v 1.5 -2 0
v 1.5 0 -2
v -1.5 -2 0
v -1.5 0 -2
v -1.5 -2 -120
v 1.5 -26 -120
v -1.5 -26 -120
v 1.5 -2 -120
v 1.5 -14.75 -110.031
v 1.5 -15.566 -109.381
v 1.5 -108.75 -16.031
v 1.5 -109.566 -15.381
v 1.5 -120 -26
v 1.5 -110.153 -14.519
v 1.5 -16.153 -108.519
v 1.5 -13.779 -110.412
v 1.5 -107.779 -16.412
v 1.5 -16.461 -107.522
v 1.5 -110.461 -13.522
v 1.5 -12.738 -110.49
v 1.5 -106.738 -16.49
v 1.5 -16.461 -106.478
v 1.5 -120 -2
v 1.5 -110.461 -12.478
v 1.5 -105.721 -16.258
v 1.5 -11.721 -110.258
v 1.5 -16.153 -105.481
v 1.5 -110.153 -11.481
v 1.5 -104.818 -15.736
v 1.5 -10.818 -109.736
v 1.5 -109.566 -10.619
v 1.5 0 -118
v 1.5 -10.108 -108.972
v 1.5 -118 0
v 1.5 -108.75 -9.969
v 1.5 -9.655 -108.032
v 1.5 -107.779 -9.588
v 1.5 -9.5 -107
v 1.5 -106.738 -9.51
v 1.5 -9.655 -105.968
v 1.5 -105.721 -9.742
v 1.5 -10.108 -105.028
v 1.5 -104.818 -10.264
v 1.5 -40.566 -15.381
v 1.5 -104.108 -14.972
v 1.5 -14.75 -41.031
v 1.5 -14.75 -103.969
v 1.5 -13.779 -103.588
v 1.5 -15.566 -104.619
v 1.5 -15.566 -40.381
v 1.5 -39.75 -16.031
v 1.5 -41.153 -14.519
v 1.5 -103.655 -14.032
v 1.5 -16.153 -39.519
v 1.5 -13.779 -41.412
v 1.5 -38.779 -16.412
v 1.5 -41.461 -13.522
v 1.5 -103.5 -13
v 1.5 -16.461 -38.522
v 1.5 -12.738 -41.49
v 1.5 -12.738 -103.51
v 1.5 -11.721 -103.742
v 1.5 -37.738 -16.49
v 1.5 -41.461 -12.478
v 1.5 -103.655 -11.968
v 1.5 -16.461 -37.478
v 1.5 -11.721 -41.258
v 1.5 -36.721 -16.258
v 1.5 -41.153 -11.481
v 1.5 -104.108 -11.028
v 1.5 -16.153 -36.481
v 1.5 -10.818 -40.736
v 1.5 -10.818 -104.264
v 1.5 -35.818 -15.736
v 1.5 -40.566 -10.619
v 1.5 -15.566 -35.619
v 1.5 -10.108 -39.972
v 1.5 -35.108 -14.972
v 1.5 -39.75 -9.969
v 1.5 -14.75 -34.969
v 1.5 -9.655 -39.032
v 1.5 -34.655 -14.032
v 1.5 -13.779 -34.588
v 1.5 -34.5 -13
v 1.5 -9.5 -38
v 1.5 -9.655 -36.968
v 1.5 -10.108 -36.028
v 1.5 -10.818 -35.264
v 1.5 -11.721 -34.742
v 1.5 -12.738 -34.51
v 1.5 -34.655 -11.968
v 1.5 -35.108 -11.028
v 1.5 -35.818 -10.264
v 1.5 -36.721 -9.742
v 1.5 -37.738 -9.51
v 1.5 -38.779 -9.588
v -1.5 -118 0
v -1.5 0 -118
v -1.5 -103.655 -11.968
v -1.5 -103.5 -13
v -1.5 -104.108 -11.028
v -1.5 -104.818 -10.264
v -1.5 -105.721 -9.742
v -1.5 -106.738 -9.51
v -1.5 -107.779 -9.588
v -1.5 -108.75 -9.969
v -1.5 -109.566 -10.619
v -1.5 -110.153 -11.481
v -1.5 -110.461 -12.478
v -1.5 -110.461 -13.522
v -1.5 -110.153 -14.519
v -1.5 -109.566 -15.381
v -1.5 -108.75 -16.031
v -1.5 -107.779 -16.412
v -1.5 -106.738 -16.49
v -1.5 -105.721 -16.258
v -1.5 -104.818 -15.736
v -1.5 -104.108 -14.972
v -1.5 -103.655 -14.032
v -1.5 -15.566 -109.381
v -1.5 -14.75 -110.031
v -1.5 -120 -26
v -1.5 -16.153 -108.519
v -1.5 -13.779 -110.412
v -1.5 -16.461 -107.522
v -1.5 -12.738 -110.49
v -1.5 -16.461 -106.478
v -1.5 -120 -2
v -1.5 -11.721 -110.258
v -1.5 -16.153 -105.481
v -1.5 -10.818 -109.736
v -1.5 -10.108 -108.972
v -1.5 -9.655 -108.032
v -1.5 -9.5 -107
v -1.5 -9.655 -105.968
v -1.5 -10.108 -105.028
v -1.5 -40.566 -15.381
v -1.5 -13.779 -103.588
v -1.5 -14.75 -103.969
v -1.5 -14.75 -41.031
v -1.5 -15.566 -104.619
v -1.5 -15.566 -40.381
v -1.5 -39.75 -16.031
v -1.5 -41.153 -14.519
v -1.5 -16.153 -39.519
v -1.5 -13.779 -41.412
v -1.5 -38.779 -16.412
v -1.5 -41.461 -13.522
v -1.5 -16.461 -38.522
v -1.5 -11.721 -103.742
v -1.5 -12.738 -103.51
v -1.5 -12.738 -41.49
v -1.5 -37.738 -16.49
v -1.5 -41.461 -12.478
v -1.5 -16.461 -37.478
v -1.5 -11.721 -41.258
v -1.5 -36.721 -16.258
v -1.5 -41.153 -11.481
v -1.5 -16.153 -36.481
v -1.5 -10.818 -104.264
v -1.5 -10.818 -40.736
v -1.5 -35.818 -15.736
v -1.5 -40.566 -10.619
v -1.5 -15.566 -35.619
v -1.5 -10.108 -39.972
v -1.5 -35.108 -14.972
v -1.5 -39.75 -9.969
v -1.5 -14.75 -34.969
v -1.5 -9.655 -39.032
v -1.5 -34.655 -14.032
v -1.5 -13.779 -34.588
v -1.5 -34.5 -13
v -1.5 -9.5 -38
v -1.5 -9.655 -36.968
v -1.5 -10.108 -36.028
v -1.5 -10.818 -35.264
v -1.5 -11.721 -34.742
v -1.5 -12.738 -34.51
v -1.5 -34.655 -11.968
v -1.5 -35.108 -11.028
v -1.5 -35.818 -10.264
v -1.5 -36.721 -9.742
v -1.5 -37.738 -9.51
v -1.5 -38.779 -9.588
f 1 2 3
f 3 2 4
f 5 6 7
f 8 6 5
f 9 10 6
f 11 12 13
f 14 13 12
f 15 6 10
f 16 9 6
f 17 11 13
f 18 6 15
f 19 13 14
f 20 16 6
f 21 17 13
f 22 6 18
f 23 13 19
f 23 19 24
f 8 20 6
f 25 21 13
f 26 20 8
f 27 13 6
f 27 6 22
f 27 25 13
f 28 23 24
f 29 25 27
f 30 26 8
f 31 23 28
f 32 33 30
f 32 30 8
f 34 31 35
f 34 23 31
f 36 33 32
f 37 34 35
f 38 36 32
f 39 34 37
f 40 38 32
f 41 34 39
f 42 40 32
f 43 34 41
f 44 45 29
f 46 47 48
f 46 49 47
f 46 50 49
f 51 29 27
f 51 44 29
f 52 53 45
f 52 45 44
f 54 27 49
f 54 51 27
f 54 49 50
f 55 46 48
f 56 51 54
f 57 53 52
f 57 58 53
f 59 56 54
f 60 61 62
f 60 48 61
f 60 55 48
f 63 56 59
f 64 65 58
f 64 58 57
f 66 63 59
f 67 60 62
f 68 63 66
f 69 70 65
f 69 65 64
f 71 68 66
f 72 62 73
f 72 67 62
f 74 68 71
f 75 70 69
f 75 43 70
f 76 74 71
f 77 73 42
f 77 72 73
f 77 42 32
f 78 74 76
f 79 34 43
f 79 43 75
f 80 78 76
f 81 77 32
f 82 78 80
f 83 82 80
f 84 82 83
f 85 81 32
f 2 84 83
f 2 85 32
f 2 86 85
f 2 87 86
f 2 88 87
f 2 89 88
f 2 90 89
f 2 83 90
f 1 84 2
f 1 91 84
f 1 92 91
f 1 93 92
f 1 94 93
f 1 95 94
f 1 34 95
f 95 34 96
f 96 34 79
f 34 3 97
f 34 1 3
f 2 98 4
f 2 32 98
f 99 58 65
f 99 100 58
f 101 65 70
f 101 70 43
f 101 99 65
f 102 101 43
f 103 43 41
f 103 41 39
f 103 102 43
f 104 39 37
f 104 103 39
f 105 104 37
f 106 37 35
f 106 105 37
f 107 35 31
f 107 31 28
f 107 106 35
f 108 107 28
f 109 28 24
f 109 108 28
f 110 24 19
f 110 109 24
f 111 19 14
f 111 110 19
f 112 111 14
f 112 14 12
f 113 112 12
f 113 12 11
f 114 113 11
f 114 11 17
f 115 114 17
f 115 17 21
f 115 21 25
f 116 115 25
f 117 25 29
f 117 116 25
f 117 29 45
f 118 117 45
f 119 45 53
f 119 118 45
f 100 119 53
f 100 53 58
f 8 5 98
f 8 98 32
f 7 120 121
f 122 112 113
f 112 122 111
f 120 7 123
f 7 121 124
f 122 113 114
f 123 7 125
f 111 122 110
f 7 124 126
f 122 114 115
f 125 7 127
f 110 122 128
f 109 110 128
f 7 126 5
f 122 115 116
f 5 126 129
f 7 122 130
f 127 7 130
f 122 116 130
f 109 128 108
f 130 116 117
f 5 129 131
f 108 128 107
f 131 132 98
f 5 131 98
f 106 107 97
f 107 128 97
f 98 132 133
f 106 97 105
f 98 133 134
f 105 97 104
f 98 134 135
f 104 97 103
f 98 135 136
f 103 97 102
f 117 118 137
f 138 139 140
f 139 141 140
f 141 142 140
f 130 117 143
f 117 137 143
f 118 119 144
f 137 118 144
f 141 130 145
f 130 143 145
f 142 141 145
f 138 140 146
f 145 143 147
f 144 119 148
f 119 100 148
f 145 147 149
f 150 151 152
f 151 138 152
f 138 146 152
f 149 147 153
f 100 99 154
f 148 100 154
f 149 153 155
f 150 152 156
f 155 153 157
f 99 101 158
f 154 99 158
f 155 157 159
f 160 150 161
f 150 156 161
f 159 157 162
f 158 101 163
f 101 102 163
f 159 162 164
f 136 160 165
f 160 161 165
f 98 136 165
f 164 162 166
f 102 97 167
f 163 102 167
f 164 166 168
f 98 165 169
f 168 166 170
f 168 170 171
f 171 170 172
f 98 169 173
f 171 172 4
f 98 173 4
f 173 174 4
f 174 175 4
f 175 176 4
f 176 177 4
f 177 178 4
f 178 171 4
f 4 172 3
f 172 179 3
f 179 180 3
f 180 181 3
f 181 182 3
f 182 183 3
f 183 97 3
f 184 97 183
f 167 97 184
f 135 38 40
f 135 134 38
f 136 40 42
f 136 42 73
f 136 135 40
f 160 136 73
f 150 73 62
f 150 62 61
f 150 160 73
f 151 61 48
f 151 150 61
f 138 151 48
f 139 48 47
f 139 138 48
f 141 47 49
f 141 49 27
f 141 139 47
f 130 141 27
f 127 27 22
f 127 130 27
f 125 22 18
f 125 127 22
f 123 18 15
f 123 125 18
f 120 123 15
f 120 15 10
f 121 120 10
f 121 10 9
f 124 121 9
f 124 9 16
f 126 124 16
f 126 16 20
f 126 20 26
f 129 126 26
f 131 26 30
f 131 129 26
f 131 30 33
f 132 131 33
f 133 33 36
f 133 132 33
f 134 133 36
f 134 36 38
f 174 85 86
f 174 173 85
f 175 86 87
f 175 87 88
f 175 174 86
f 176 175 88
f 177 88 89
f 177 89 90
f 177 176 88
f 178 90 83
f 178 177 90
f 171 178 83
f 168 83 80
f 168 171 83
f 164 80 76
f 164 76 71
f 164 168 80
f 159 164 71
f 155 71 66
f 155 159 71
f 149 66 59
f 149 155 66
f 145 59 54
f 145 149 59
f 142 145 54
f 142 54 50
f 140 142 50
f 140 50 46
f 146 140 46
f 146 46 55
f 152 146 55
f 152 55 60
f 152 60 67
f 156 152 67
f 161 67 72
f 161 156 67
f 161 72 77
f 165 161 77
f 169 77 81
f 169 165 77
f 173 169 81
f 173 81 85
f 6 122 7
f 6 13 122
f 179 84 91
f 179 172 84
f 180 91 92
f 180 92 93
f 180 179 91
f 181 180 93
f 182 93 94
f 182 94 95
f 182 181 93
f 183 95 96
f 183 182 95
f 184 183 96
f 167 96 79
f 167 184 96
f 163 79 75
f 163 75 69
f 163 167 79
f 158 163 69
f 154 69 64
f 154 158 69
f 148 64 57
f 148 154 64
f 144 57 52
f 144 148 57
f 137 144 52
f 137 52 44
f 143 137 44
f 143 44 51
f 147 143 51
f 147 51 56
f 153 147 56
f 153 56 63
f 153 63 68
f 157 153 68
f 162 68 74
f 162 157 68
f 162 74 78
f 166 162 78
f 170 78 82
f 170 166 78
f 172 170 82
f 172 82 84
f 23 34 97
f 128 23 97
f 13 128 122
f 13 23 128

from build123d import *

# Parameters (mm, degrees)
F0_R     = 3.5
F1_DEPTH = 1.5
F2_SIZE  = 2


with BuildPart() as f1:
    # F0 (on Right) → F1 (new body, symmetric)
    with BuildSketch(Plane.YZ):
        Polygon((-73, -73), (0, 0), (-120, 0), (-120, -26), align=None)
        with Locations((-107, -13)):
            Circle(F0_R, mode=Mode.SUBTRACT)
        with Locations((-38, -13)):
            Circle(F0_R, mode=Mode.SUBTRACT)
        Polygon((0, -120), (0, 0), (-73, -73), (-26, -120), align=None)
        with Locations((-13, -107)):
            Circle(F0_R, mode=Mode.SUBTRACT)
        with Locations((-13, -38)):
            Circle(F0_R, mode=Mode.SUBTRACT)
    extrude(amount=F1_DEPTH, both=True)

    # F2
    f2_edges = [f1.edges().sort_by_distance(p)[0] for p in [
        (0, -120, 0),
        (0, 0, 0),
        (0, 0, -120),
    ]]
    chamfer(f2_edges, length=F2_SIZE)


solid = f1.part
